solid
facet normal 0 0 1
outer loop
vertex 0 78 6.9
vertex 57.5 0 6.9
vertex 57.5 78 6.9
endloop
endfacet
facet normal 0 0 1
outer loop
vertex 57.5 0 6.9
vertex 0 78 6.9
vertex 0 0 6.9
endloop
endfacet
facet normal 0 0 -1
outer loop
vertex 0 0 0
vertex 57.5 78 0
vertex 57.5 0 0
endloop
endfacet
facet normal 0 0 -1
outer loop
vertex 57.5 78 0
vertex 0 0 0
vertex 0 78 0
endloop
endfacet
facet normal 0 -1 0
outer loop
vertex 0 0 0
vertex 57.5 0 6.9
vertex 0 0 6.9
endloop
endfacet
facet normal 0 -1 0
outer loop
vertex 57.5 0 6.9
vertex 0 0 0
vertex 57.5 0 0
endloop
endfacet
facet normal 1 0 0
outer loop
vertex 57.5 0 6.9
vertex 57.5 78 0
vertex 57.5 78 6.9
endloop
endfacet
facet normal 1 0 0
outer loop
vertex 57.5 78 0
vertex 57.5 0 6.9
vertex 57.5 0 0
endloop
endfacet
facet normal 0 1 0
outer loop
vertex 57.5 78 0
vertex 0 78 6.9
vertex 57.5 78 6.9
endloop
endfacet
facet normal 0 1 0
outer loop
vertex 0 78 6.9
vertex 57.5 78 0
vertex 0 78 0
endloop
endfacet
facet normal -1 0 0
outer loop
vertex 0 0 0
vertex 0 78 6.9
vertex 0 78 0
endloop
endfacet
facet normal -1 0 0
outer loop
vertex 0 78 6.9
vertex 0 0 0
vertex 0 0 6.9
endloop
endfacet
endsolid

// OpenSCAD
// This is the ideal battery, but it's *just* too tall
// https://www.amazon.co.uk/EEMB-Rechargeable-Replacement-103395-Connector/dp/B08215B4KK?ref_=ast_sto_dp&th=1&psc=1
// cube( [33.5, 96, 10.3mm] );

// Smaller, smaller capacity, but it will fit
// https://www.amazon.co.uk/EEMB-Battery-rechargeable-Connector-Certified/dp/B09DPR4V6L?ref_=ast_sto_dp&th=1
cube( [57.5, 78, 6.9] );
